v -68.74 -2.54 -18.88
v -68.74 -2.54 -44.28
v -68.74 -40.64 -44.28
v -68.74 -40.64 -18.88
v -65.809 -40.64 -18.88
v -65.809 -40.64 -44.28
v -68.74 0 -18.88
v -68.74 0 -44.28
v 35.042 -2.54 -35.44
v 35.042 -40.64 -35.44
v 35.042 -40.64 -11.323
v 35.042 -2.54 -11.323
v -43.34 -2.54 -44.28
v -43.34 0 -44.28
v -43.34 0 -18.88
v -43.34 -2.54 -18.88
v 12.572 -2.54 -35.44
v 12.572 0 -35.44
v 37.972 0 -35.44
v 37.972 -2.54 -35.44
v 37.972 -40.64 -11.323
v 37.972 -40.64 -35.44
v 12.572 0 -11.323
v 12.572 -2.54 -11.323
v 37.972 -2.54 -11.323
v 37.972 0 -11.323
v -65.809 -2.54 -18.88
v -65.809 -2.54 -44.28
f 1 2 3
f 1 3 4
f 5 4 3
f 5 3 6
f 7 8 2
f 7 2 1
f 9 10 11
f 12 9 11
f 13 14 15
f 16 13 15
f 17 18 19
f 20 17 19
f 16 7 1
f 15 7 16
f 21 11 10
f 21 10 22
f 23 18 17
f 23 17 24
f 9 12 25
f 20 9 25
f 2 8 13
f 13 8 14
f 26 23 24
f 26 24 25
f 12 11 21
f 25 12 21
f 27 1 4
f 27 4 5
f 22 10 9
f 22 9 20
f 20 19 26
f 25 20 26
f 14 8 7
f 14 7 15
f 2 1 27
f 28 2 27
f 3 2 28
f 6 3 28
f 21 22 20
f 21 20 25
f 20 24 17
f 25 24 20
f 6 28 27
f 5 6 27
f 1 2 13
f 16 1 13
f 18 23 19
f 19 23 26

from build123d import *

# Parameters (mm, degrees)
F0_W     = 25.4
F0_H     = 24.116988
F0_H_2   = 25.4
F1_DEPTH = 2.54
F2_W     = 2.930686
F2_H     = 25.4
F3_W     = 2.930678
F3_H     = 24.116988
F4_DEPTH = 38.1


with BuildPart() as f1:
    # F0 (on Front) → F1 (new body)
    with BuildSketch(Plane.XZ):
        with Locations((25.272356, -23.381314)):
            Rectangle(F0_W, F0_H)
        with Locations((-56.039779, -31.579505)):
            Rectangle(F0_W, F0_H_2)
    extrude(amount=F1_DEPTH)


with BuildPart() as f4:
    # F2 (on face) + F3 (on face) → F4 (new body)
    with BuildSketch(Plane.XZ.offset(2.54)):
        with Locations((-67.274436, -31.579505)):
            Rectangle(F2_W, F2_H)
    with BuildSketch(Plane.XZ.offset(2.54)):
        with Locations((36.507017, -23.381314)):
            Rectangle(F3_W, F3_H)
    extrude(amount=F4_DEPTH)


solid = Compound([f1.part, f4.part])
